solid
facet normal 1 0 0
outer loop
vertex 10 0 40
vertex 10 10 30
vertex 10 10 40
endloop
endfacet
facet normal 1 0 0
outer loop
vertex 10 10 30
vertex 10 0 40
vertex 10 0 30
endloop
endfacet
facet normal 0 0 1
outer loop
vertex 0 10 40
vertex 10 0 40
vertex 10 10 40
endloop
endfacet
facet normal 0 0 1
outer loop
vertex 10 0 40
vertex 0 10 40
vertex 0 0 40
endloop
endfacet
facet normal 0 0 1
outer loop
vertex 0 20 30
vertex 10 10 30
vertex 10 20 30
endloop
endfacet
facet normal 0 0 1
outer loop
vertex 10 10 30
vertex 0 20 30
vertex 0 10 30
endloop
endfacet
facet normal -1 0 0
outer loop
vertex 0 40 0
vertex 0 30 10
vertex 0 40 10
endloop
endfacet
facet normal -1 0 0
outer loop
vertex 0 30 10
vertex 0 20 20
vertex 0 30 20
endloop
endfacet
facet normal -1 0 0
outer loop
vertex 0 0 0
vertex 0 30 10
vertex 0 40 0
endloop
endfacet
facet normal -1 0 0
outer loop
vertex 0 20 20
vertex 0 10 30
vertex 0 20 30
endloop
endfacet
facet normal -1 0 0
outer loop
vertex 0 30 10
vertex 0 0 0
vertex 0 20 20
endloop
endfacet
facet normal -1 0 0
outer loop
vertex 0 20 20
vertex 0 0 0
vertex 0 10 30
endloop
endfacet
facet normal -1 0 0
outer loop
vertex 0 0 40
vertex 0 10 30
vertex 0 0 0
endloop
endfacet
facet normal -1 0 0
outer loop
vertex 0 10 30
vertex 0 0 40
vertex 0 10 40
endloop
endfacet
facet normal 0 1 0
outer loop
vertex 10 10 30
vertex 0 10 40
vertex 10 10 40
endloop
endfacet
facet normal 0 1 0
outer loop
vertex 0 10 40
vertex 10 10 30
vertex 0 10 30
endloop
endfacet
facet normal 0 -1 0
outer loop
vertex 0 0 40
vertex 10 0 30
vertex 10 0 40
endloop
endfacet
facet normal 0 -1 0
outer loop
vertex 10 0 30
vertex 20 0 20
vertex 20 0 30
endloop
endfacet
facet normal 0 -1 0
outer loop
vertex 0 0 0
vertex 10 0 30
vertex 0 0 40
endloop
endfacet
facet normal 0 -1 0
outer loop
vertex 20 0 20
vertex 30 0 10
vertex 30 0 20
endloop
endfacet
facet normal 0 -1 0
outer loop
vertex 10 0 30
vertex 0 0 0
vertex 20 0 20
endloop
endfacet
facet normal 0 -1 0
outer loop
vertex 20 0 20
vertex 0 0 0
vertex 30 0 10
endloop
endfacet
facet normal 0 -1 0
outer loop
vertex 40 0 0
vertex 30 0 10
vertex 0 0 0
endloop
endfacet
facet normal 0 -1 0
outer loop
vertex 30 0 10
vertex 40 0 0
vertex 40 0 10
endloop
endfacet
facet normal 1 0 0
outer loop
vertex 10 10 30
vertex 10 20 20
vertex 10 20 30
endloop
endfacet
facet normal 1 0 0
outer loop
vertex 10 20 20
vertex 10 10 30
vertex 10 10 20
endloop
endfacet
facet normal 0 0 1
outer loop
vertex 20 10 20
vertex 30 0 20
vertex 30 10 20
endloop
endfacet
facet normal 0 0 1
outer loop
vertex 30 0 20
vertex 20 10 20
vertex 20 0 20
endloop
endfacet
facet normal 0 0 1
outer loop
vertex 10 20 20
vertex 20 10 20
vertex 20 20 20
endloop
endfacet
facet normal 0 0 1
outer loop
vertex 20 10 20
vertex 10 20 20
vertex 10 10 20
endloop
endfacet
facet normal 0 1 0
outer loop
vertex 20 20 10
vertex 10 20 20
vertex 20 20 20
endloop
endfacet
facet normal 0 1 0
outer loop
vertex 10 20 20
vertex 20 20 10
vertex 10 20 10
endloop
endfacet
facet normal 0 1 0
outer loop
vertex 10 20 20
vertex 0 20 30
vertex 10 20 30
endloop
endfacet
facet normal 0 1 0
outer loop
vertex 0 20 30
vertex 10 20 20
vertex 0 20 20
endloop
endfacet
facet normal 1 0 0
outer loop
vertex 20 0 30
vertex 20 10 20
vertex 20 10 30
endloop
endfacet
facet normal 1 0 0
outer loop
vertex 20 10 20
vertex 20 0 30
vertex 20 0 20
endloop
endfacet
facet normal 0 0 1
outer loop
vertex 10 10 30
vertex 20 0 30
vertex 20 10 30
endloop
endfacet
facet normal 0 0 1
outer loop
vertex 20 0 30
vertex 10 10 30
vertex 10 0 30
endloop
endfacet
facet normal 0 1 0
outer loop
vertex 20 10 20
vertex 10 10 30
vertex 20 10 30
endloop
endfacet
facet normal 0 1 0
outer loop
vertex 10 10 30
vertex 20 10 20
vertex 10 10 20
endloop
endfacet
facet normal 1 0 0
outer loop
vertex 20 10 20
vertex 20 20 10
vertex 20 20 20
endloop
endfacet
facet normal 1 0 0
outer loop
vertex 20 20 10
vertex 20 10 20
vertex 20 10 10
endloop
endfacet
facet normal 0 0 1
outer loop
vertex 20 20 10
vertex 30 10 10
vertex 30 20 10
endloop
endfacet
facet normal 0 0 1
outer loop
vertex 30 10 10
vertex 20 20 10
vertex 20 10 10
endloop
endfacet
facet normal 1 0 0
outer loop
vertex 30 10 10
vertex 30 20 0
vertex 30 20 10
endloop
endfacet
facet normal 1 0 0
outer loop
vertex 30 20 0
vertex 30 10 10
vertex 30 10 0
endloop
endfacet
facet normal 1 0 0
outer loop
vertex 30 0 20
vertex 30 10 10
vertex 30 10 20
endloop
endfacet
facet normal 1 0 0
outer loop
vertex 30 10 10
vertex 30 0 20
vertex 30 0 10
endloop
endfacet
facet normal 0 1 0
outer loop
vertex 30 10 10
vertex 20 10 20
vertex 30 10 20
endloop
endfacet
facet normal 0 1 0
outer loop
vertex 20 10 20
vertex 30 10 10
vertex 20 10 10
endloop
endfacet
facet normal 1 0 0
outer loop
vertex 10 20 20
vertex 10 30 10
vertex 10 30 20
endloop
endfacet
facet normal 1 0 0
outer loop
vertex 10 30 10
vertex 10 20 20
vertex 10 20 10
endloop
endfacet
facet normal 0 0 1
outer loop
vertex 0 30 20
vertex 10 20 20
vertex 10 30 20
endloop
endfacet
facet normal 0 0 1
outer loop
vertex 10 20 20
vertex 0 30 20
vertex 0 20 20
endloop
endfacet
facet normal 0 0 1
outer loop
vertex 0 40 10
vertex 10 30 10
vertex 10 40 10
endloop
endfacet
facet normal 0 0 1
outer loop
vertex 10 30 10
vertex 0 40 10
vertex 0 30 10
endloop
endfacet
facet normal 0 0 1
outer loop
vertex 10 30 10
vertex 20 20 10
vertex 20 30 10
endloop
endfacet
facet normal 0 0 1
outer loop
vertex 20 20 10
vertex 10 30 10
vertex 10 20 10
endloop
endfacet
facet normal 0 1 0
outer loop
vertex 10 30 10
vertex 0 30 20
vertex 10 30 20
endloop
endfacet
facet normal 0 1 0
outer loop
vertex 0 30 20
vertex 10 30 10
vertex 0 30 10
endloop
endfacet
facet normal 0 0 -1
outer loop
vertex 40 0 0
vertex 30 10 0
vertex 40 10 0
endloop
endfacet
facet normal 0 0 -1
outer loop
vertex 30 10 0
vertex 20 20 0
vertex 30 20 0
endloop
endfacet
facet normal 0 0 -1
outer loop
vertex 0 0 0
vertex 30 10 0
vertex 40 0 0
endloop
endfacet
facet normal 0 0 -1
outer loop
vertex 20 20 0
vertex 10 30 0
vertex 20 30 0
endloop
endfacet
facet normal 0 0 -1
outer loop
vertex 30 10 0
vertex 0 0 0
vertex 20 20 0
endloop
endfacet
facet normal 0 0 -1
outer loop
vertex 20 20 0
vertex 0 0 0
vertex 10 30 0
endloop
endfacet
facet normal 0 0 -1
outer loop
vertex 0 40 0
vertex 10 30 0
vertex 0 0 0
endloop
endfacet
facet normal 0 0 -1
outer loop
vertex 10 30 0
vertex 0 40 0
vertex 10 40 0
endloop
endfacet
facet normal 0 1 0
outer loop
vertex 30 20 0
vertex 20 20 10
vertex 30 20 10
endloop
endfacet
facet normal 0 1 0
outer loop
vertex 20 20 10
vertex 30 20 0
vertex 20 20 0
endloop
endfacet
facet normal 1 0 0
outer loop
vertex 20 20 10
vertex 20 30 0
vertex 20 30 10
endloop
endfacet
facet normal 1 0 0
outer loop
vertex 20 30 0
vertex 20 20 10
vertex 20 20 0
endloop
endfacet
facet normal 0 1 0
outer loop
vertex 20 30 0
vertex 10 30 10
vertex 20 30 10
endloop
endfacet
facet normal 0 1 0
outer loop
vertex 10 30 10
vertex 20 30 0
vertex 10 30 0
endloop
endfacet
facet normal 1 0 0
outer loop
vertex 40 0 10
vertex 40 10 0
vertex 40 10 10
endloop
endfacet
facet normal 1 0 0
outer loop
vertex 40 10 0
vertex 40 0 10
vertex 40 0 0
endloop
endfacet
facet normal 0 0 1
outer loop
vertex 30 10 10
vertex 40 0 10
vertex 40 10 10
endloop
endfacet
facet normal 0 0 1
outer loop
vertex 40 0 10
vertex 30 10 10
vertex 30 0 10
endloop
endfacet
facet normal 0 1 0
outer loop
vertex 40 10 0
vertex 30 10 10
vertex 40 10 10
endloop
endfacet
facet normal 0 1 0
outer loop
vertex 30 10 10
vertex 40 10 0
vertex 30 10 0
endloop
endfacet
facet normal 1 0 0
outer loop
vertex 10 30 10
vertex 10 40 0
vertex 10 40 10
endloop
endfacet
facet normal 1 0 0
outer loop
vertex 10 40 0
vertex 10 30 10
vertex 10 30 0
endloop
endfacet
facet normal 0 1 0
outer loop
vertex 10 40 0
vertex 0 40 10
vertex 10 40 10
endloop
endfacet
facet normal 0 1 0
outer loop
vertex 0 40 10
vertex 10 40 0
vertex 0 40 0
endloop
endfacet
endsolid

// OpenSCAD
//3D Shapes- Calibration Pyramid

//level 4
translate([0,0,30]) cube(10);

//level 3
translate([0,0,20]) cube([10, 20, 10]);
translate([10,0,20]) cube(10);

//level 2
translate([0,0,10]) cube([20, 20, 10]);
translate([20,0,10]) cube(10);
translate([0,20,10]) cube(10);

//level 1
cube([30, 20, 10]);
translate([0,20,0]) cube([20,10,10]);
translate([30,0,0]) cube(10);
translate([0,30,0]) cube(10);
